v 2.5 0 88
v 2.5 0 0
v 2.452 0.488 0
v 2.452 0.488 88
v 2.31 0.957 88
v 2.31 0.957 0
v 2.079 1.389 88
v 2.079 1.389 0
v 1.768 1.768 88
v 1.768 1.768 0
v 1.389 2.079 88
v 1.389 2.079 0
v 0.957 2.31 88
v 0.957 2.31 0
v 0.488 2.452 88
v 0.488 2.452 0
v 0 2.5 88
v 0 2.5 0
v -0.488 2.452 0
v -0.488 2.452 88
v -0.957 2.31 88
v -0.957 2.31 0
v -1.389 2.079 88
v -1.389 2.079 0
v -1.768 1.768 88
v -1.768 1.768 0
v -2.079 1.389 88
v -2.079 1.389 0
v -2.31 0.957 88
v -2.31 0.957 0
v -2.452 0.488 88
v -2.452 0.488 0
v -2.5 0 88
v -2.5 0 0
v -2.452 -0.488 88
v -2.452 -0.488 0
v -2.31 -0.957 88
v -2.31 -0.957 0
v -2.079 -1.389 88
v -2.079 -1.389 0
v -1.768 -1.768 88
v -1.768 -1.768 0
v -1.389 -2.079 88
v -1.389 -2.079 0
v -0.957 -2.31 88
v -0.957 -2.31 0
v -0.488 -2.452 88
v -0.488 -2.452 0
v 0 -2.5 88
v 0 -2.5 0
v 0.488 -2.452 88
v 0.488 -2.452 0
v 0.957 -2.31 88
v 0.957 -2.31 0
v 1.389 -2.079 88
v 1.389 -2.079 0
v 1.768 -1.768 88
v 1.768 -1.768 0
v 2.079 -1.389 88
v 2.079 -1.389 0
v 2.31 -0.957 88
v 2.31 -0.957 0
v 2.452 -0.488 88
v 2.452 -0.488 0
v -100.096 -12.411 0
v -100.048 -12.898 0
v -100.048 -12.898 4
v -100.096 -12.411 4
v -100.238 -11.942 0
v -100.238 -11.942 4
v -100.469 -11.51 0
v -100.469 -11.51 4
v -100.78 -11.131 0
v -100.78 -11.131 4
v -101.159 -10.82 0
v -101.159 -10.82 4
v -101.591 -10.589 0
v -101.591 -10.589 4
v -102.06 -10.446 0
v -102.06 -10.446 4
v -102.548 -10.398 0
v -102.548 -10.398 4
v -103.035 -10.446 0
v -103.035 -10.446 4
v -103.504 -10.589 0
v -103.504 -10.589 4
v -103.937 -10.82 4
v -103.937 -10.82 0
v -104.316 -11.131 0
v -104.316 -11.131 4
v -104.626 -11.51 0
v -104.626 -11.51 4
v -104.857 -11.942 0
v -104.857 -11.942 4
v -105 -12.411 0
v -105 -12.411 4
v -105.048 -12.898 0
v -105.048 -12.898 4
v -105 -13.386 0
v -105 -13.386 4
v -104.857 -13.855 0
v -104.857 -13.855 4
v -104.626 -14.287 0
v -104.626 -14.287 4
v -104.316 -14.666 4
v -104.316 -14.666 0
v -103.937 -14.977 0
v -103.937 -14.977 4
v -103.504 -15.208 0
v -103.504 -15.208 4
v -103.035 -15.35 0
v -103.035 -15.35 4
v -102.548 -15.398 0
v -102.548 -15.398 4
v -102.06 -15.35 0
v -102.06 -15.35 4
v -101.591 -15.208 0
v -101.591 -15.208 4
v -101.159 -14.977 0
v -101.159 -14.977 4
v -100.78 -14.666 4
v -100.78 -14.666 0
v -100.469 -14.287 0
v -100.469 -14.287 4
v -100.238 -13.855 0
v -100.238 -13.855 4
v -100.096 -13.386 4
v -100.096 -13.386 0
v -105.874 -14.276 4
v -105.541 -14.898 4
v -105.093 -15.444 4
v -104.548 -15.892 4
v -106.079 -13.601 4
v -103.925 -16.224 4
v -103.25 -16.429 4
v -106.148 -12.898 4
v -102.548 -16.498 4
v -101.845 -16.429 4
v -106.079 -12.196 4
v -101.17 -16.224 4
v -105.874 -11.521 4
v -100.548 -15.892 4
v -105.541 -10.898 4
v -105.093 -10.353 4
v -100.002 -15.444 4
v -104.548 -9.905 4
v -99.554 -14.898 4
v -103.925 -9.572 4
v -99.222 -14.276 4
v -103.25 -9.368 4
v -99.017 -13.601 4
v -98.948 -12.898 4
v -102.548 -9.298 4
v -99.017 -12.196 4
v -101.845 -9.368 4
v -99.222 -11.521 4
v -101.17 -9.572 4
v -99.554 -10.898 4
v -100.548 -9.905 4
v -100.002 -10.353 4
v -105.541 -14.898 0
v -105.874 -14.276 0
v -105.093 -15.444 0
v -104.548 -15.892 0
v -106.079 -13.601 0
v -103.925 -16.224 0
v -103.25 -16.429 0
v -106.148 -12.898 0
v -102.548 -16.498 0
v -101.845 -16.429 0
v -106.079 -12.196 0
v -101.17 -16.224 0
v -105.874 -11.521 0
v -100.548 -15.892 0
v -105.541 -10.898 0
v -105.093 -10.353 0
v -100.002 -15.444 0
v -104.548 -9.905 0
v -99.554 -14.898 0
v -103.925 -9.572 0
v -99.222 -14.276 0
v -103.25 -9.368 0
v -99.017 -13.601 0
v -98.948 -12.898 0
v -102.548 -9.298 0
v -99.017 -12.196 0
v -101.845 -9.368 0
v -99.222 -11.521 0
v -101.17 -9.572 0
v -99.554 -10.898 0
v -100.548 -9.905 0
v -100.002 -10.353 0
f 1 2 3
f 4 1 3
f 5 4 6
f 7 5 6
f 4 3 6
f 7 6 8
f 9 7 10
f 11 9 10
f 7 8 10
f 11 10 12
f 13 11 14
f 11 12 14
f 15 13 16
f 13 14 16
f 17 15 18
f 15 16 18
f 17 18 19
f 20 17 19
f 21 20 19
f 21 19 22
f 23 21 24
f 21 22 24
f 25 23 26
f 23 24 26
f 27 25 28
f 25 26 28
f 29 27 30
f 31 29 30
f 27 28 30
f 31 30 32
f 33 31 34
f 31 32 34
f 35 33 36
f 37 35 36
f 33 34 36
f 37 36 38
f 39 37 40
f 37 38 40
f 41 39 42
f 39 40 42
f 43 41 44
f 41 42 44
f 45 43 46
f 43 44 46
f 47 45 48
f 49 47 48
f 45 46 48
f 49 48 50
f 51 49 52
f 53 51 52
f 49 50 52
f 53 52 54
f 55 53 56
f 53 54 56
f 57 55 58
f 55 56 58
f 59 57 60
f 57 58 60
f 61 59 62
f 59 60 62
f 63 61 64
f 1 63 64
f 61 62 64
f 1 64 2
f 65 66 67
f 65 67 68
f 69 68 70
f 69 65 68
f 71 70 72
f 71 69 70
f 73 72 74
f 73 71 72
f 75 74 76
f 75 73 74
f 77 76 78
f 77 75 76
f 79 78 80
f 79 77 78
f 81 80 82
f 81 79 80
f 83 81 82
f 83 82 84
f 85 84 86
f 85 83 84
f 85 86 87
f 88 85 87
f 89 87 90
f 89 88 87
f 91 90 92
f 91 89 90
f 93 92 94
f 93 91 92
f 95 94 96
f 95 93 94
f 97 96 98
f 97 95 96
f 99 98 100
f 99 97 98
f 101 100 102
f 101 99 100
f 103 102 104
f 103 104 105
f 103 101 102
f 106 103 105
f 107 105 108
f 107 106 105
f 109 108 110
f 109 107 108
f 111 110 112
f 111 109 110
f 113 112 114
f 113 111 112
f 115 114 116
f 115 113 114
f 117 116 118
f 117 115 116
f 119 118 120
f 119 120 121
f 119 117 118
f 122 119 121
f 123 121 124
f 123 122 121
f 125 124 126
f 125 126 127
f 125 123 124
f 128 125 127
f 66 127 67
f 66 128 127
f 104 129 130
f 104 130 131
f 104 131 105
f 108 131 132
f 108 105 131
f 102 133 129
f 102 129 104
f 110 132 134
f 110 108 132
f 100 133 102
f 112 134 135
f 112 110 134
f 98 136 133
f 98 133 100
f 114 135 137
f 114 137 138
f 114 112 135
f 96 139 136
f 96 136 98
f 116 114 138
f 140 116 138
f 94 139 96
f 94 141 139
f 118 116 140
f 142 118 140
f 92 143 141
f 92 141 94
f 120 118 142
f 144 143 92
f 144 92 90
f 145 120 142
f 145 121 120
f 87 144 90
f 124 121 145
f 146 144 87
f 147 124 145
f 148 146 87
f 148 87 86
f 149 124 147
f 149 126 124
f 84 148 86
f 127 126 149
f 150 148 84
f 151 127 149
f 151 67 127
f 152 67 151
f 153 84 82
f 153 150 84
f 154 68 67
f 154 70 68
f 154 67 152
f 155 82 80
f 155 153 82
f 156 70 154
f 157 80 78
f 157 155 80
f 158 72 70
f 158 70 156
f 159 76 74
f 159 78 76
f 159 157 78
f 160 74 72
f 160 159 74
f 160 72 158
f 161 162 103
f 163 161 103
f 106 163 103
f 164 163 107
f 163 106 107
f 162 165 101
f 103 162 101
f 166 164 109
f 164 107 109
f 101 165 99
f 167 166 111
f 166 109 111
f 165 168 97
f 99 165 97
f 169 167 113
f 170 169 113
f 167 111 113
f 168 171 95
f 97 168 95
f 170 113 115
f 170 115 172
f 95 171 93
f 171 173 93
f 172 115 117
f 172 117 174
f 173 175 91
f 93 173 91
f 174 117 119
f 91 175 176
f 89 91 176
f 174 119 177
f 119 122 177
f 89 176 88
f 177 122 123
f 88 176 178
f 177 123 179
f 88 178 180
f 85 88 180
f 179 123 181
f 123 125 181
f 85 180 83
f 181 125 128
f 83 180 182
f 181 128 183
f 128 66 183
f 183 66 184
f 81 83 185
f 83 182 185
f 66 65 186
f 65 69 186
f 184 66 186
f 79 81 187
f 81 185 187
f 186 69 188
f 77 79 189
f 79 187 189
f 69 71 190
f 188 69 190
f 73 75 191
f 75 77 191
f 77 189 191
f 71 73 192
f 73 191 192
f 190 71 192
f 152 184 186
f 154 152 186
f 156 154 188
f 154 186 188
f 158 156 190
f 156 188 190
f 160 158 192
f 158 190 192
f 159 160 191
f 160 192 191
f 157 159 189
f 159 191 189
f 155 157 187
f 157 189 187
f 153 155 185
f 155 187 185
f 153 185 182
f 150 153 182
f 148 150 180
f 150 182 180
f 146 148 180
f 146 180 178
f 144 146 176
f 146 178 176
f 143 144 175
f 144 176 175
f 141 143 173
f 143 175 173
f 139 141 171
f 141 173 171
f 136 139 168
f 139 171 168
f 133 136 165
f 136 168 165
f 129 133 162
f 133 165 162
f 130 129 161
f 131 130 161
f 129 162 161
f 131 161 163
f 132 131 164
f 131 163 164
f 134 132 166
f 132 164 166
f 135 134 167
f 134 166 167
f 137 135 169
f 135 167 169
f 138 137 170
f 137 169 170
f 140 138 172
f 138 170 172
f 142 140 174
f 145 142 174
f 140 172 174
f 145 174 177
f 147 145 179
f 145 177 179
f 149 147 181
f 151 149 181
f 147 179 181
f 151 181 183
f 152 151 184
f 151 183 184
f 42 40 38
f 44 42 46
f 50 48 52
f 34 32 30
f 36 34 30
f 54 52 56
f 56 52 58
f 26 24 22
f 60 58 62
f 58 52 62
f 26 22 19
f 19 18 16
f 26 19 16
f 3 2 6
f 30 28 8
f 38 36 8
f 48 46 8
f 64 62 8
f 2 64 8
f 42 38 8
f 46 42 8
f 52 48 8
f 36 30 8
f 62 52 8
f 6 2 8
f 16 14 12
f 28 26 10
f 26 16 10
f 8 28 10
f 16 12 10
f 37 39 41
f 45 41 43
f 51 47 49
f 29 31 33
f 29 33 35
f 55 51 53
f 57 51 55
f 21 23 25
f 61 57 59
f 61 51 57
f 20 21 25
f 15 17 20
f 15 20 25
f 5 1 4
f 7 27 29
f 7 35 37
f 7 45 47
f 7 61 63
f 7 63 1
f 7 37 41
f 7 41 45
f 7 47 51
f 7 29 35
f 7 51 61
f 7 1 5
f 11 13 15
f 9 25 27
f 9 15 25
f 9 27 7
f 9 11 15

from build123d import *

# Parameters (mm, degrees)
F0_R     = 2.5
F1_DEPTH = 88
F2_R     = 3.6
F2_R_2   = 2.5
F3_DEPTH = 4


with BuildPart() as f1:
    # F0 (on Top) → F1 (new body)
    with BuildSketch(Plane.XY):
        Circle(F0_R)
    extrude(amount=F1_DEPTH)


with BuildPart() as f3:
    # F2 (on Top) → F3 (new body)
    with BuildSketch(Plane.XY):
        with Locations((-102.547772, -12.898434)):
            Circle(F2_R)
        with Locations((-102.547772, -12.898434)):
            Circle(F2_R_2, mode=Mode.SUBTRACT)
    extrude(amount=F3_DEPTH)


solid = Compound([f1.part, f3.part])
